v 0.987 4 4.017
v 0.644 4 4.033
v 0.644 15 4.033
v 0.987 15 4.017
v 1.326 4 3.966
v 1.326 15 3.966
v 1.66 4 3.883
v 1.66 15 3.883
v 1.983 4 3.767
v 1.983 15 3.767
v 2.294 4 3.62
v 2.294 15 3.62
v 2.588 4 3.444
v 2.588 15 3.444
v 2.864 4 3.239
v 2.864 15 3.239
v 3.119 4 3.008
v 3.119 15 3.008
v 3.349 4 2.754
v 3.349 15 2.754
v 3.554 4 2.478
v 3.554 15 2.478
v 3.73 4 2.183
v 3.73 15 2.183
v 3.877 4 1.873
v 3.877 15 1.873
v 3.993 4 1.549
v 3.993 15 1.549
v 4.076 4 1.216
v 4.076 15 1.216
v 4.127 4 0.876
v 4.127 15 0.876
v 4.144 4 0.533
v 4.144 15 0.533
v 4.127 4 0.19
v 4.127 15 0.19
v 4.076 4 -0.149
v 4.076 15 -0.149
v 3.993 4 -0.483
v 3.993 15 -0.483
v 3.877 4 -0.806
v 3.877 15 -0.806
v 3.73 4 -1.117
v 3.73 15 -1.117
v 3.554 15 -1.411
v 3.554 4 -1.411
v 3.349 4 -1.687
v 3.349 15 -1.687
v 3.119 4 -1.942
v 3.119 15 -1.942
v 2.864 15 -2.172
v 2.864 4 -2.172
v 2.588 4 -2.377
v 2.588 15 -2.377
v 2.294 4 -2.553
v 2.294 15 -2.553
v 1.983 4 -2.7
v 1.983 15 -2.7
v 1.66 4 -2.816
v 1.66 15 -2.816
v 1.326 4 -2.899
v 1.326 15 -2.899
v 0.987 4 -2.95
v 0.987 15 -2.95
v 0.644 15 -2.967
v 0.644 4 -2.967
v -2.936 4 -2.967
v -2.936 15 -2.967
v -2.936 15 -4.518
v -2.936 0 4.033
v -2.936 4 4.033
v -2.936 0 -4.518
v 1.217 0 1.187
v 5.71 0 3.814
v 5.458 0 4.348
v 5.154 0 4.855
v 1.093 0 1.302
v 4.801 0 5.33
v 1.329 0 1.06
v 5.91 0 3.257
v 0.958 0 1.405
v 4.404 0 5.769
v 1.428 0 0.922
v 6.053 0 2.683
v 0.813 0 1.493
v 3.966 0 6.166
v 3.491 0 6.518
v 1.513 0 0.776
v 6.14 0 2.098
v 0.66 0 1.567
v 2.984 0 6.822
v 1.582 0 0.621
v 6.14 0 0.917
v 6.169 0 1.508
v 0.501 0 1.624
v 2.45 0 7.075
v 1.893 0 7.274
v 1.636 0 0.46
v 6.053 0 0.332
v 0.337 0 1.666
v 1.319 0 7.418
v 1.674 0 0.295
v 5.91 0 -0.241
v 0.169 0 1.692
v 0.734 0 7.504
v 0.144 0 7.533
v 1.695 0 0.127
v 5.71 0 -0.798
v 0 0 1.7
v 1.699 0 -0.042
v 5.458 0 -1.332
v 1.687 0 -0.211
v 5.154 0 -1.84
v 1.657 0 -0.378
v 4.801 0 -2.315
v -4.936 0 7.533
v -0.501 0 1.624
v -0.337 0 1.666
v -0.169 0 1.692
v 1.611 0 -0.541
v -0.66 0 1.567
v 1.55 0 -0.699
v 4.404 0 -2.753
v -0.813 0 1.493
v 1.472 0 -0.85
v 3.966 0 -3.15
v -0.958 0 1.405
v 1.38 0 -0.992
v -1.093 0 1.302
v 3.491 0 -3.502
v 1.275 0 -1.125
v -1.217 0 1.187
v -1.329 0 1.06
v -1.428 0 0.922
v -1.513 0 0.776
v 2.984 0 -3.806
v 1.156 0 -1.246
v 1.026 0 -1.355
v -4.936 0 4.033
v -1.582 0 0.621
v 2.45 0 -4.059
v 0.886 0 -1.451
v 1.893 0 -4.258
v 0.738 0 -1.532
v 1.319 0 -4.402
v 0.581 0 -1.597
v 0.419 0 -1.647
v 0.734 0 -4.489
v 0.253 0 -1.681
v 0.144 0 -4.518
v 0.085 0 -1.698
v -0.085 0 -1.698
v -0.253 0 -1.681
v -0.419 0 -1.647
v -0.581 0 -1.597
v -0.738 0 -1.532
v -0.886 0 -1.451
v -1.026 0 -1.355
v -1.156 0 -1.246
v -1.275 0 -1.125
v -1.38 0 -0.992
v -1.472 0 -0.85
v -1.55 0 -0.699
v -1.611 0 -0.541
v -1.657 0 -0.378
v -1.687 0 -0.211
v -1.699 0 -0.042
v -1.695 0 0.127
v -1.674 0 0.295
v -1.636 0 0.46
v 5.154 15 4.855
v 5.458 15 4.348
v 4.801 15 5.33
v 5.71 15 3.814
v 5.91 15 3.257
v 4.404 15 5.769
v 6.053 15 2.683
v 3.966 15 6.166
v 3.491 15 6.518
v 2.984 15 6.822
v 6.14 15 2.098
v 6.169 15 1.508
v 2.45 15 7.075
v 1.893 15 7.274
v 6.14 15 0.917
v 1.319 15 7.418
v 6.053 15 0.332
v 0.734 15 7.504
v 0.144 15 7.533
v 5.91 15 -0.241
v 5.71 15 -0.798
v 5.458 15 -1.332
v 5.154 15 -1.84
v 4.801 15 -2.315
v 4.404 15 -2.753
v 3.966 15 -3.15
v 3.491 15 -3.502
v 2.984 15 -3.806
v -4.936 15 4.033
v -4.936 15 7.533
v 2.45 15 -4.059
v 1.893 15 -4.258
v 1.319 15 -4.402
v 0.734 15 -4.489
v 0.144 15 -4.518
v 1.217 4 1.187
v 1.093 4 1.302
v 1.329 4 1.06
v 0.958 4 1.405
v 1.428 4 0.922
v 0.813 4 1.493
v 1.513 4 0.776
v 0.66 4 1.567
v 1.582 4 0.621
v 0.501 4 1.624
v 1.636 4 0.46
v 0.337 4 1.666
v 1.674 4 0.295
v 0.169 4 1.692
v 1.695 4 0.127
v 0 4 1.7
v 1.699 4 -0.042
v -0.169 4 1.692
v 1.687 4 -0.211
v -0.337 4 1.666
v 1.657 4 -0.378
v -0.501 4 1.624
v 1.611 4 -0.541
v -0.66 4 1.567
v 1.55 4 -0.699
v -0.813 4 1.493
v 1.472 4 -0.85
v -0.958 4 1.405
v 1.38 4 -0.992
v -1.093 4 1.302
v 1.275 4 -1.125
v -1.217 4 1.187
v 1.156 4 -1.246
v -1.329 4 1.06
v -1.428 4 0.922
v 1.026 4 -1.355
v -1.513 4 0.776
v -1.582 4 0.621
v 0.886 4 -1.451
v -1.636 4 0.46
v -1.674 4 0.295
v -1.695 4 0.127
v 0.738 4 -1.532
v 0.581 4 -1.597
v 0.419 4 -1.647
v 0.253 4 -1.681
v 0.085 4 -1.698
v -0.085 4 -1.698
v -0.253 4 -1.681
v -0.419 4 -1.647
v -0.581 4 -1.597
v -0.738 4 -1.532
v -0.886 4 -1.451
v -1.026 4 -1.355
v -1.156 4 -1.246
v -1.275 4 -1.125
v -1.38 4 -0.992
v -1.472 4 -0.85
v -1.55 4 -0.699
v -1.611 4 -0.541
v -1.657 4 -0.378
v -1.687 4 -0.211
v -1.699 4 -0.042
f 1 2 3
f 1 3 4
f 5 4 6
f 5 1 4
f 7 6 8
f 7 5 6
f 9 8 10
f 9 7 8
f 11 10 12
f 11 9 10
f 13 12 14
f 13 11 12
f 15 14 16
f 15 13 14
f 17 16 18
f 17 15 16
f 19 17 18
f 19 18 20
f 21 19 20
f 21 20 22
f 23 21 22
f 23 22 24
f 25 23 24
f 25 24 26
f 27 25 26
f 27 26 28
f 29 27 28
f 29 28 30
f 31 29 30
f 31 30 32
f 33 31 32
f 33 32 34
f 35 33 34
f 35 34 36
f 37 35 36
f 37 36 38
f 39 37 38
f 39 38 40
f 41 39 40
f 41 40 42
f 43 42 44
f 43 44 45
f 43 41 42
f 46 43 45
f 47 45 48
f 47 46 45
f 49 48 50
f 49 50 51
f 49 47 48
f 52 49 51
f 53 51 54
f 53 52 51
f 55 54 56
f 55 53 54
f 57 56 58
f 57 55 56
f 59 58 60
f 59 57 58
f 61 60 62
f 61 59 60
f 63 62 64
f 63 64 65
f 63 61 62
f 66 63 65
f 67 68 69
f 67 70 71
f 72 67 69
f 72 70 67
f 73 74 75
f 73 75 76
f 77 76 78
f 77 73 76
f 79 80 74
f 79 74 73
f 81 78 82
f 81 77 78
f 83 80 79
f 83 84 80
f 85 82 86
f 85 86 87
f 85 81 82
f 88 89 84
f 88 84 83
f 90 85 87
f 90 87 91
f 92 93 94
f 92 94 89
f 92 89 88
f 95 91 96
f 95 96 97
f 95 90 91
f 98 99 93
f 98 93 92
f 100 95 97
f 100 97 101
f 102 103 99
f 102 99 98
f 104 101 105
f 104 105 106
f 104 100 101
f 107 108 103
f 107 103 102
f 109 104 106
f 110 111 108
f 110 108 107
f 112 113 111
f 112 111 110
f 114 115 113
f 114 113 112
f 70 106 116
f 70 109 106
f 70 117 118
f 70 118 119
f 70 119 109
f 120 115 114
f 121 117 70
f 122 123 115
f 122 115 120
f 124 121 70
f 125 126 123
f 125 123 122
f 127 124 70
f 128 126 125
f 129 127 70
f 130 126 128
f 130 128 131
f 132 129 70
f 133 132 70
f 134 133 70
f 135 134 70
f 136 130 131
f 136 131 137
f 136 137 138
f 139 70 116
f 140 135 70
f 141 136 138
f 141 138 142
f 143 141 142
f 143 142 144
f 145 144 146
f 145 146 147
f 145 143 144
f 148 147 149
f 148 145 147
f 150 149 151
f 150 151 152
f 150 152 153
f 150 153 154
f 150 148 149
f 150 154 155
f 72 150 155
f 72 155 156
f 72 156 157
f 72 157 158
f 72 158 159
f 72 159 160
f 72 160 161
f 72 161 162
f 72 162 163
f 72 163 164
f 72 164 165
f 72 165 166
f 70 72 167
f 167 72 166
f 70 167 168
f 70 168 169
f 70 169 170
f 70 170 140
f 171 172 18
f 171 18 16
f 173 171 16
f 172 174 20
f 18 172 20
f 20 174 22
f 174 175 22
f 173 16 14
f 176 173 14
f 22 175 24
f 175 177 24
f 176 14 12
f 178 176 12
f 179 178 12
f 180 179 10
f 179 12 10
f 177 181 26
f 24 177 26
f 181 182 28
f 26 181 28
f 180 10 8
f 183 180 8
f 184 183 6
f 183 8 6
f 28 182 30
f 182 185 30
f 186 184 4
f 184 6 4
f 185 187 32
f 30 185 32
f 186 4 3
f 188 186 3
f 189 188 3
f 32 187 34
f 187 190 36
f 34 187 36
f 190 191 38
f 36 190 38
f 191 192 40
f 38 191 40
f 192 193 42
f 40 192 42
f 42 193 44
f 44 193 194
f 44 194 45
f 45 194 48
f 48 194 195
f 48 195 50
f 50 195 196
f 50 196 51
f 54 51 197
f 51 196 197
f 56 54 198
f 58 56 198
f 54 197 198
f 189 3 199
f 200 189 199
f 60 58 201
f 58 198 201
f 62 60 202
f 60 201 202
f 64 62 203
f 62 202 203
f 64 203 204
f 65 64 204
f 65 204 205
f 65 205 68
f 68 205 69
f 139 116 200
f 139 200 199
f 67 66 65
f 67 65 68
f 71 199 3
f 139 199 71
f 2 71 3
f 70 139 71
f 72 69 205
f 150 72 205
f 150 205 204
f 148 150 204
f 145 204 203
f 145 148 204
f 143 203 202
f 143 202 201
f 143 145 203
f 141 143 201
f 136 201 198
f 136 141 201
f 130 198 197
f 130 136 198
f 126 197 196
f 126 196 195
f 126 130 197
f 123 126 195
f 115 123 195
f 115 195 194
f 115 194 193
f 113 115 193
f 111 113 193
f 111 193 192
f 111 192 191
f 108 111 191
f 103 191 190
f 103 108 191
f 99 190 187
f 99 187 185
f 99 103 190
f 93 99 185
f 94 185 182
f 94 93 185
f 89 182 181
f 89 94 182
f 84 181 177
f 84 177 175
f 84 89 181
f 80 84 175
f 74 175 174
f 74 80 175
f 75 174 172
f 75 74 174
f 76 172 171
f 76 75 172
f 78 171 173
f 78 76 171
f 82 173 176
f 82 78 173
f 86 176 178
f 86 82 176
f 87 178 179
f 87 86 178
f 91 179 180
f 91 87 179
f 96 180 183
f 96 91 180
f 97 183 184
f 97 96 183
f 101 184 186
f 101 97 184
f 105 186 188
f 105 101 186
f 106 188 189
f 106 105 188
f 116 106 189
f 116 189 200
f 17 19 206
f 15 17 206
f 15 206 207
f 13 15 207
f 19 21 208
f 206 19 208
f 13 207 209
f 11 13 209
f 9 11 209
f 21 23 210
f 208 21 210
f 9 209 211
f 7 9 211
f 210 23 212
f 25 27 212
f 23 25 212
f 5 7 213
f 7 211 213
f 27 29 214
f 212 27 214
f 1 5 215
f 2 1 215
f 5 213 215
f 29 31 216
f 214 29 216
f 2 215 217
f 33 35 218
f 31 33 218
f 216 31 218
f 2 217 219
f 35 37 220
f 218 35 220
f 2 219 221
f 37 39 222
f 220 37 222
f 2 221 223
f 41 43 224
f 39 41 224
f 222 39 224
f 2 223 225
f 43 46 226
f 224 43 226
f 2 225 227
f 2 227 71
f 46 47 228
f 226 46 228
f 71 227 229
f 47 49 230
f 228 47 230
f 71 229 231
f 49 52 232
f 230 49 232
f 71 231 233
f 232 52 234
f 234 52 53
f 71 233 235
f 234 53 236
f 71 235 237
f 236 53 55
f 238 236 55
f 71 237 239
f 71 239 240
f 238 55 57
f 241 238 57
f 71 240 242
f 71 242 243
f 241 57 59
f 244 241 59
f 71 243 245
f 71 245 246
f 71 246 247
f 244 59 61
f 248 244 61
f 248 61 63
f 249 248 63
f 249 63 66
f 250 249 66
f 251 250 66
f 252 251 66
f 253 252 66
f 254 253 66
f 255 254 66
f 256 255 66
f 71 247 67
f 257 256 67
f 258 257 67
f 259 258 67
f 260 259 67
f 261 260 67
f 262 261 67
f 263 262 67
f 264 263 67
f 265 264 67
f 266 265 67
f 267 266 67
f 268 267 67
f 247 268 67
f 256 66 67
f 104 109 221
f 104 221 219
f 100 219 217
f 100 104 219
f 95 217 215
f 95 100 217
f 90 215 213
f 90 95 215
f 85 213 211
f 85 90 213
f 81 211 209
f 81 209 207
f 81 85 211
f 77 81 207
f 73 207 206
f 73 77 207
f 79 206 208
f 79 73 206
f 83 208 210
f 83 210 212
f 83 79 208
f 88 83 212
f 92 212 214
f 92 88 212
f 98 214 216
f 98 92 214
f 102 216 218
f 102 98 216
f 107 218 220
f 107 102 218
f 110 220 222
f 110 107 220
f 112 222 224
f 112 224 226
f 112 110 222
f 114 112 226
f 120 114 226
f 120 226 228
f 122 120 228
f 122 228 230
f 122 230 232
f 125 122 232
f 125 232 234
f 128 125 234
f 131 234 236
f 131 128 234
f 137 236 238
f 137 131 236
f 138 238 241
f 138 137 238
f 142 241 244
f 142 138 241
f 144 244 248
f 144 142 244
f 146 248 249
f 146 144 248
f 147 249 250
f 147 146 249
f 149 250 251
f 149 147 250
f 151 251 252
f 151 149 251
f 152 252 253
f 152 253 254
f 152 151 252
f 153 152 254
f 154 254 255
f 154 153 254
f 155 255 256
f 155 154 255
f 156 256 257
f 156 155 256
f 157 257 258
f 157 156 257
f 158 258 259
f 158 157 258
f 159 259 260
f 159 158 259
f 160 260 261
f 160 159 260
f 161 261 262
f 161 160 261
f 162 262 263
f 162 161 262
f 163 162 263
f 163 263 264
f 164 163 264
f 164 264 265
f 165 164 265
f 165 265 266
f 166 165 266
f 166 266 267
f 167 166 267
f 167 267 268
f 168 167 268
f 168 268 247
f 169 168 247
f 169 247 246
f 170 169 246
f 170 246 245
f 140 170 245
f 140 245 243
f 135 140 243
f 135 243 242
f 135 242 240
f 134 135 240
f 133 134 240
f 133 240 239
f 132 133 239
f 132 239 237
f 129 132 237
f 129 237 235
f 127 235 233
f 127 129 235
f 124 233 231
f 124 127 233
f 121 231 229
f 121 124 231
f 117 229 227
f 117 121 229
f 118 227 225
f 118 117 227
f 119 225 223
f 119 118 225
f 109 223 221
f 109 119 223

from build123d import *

# Parameters (mm, degrees)
SKETCH1_R           = 1.7
BOSS_EXTRUDE2_DEPTH = 4
BOSS_EXTRUDE3_DEPTH = 15


with BuildPart() as part:
    # Sketch1 → Boss-Extrude2 (new body)
    with BuildSketch(Plane(origin=(0, 0, 0), x_dir=(1, 0, 0), z_dir=(0, 1, 0))):
        with BuildLine():
            Line((-2.93579488, -0.53336368), (-2.93579488, 2.96663632))
            Line((-2.93579488, 2.96663632), (0.643666224, 2.96663632))
            ThreePointArc((0.643666224, 2.96663632), (4.143666224, -0.53336368), (0.643666224, -4.03336368))
            Line((0.643666224, -4.03336368), (-2.93579488, -4.03336368))
            Line((-2.93579488, -4.03336368), (-2.93579488, -0.53336368))
        make_face()
        with Locations(Location((0, 0, 0), (0, 0, 270))):
            Circle(SKETCH1_R, mode=Mode.SUBTRACT)
    extrude(amount=BOSS_EXTRUDE2_DEPTH)

    # Sketch2 → Boss-Extrude3 (add)
    with BuildSketch(Plane(origin=(0, 0, 0), x_dir=(1, 0, 0), z_dir=(0, 1, 0))):
        with BuildLine():
            Line((-2.93579488, 4.517571778), (0.143666226, 4.517571778))
            ThreePointArc((0.143666226, 4.517571778), (6.169133955, -1.507895951), (0.143666226, -7.53336368))
            Line((0.143666226, -7.53336368), (-3.435794878, -7.53336368))
            Line((-3.435794878, -7.53336368), (-4.93579488, -7.53336368))
            Line((-4.93579488, -7.53336368), (-4.93579488, -4.03336368))
            Line((-4.93579488, -4.03336368), (-2.93579488, -4.03336368))
            Line((-2.93579488, -4.03336368), (0.643666224, -4.03336368))
            ThreePointArc((0.643666224, -4.03336368), (4.143666224, -0.53336368), (0.643666224, 2.96663632))
            Line((0.643666224, 2.96663632), (-2.93579488, 2.96663632))
            Line((-2.93579488, 2.96663632), (-2.93579488, 4.517571778))
        make_face()
    extrude(amount=BOSS_EXTRUDE3_DEPTH)


solid = part.part
